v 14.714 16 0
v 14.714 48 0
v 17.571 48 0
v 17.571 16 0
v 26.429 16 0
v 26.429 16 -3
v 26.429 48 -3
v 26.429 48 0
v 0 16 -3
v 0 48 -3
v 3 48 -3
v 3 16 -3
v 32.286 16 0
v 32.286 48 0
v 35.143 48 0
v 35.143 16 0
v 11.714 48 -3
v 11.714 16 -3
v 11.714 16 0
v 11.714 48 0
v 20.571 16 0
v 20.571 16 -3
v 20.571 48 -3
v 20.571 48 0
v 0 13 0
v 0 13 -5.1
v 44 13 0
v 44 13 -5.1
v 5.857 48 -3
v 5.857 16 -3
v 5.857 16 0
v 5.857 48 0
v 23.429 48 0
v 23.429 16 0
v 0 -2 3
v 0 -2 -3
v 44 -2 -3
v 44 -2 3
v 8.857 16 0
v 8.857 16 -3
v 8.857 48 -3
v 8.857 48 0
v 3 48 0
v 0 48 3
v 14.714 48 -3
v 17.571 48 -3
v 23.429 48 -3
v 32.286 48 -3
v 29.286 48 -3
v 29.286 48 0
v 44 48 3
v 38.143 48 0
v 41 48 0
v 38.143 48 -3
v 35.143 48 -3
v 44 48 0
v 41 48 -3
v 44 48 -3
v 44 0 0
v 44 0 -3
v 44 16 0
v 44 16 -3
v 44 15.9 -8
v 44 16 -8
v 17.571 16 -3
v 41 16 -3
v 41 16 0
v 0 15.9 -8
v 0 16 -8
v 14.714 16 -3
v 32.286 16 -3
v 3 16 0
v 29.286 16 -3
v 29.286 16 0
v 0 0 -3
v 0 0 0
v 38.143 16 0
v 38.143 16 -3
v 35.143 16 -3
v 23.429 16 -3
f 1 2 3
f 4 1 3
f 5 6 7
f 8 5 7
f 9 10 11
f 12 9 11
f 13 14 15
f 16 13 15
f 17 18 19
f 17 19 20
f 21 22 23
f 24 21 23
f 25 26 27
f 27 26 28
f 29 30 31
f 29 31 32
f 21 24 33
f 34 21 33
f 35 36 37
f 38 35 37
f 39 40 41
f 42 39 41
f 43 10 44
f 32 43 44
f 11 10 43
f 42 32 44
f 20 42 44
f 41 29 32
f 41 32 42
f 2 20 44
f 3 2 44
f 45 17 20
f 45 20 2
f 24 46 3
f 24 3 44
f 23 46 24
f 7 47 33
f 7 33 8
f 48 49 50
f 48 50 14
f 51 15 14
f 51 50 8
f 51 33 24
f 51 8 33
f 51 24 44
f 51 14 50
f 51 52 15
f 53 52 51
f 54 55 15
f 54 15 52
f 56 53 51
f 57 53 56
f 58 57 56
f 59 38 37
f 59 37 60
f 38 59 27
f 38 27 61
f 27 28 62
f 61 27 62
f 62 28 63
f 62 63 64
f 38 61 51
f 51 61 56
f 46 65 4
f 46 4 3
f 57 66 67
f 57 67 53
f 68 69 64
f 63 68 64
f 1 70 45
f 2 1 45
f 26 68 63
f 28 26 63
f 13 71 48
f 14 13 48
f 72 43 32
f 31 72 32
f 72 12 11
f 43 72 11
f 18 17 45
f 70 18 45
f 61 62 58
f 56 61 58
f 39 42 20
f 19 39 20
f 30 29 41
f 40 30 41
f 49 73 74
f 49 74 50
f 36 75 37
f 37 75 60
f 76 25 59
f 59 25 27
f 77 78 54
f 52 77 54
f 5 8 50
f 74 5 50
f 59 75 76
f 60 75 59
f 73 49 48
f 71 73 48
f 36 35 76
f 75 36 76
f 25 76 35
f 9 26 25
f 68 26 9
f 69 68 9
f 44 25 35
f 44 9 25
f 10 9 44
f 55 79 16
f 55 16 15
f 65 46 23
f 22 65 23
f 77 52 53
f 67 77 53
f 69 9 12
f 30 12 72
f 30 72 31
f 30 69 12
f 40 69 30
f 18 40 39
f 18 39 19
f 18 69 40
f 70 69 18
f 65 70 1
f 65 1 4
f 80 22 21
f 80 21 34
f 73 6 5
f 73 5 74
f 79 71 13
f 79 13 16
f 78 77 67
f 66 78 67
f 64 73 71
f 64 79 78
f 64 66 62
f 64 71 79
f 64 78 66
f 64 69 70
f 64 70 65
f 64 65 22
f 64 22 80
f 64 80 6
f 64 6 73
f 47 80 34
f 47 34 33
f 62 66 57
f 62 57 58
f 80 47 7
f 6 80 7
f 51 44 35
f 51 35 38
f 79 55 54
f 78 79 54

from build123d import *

# Parameters (mm, degrees)
BOX_W                  = 44
BOX_H                  = 48
BOX_DEPTH              = 3
BOX001_W               = 44
BOX001_H               = 2
BOX001_DEPTH           = 6
BOX002_W               = 44
BOX002_H               = 3
BOX002_DEPTH           = 8
CHAMFER_SIZE           = 2.9
BOX003_W               = 3
BOX003_H               = 32
BOX003_DEPTH           = 3
LINEARPATTERN001_COUNT = 8
LINEARPATTERN001_PITCH = 5.857143


with BuildPart() as part:
    # Box → Box (join)
    with BuildSketch(Plane.XY):
        with Locations((22, 24)):
            Rectangle(BOX_W, BOX_H)
    extrude(amount=BOX_DEPTH)

    # Box001 → Box001 (join)
    with BuildSketch(Plane(origin=(0, -2, -3), x_dir=(1, 0, 0), z_dir=(0, 0, 1))):
        with Locations((22, 1)):
            Rectangle(BOX001_W, BOX001_H)
    extrude(amount=BOX001_DEPTH)

    # Box002 → Box002 (join)
    with BuildSketch(Plane(origin=(0, 13, -8), x_dir=(1, 0, 0), z_dir=(0, 0, 1))):
        with Locations((22, 1.5)):
            Rectangle(BOX002_W, BOX002_H)
    extrude(amount=BOX002_DEPTH)

    # Chamfer
    chamfer_edges = [part.edges().sort_by_distance(p)[0] for p in [
        (22, 13, -8),
    ]]
    chamfer(chamfer_edges, length=CHAMFER_SIZE)

    # Box003 → Box003 (join)
    with BuildSketch(Plane(origin=(0, 16, -3), x_dir=(1, 0, 0), z_dir=(0, 0, 1))):
        with Locations((1.5, 16)):
            Rectangle(BOX003_W, BOX003_H)
    box003 = extrude(amount=BOX003_DEPTH)

    # LinearPattern001: Box003 ×8
    with Locations(*[(i * LINEARPATTERN001_PITCH, 0, 0) for i in range(1, LINEARPATTERN001_COUNT)]):
        add(box003)


solid = part.part
